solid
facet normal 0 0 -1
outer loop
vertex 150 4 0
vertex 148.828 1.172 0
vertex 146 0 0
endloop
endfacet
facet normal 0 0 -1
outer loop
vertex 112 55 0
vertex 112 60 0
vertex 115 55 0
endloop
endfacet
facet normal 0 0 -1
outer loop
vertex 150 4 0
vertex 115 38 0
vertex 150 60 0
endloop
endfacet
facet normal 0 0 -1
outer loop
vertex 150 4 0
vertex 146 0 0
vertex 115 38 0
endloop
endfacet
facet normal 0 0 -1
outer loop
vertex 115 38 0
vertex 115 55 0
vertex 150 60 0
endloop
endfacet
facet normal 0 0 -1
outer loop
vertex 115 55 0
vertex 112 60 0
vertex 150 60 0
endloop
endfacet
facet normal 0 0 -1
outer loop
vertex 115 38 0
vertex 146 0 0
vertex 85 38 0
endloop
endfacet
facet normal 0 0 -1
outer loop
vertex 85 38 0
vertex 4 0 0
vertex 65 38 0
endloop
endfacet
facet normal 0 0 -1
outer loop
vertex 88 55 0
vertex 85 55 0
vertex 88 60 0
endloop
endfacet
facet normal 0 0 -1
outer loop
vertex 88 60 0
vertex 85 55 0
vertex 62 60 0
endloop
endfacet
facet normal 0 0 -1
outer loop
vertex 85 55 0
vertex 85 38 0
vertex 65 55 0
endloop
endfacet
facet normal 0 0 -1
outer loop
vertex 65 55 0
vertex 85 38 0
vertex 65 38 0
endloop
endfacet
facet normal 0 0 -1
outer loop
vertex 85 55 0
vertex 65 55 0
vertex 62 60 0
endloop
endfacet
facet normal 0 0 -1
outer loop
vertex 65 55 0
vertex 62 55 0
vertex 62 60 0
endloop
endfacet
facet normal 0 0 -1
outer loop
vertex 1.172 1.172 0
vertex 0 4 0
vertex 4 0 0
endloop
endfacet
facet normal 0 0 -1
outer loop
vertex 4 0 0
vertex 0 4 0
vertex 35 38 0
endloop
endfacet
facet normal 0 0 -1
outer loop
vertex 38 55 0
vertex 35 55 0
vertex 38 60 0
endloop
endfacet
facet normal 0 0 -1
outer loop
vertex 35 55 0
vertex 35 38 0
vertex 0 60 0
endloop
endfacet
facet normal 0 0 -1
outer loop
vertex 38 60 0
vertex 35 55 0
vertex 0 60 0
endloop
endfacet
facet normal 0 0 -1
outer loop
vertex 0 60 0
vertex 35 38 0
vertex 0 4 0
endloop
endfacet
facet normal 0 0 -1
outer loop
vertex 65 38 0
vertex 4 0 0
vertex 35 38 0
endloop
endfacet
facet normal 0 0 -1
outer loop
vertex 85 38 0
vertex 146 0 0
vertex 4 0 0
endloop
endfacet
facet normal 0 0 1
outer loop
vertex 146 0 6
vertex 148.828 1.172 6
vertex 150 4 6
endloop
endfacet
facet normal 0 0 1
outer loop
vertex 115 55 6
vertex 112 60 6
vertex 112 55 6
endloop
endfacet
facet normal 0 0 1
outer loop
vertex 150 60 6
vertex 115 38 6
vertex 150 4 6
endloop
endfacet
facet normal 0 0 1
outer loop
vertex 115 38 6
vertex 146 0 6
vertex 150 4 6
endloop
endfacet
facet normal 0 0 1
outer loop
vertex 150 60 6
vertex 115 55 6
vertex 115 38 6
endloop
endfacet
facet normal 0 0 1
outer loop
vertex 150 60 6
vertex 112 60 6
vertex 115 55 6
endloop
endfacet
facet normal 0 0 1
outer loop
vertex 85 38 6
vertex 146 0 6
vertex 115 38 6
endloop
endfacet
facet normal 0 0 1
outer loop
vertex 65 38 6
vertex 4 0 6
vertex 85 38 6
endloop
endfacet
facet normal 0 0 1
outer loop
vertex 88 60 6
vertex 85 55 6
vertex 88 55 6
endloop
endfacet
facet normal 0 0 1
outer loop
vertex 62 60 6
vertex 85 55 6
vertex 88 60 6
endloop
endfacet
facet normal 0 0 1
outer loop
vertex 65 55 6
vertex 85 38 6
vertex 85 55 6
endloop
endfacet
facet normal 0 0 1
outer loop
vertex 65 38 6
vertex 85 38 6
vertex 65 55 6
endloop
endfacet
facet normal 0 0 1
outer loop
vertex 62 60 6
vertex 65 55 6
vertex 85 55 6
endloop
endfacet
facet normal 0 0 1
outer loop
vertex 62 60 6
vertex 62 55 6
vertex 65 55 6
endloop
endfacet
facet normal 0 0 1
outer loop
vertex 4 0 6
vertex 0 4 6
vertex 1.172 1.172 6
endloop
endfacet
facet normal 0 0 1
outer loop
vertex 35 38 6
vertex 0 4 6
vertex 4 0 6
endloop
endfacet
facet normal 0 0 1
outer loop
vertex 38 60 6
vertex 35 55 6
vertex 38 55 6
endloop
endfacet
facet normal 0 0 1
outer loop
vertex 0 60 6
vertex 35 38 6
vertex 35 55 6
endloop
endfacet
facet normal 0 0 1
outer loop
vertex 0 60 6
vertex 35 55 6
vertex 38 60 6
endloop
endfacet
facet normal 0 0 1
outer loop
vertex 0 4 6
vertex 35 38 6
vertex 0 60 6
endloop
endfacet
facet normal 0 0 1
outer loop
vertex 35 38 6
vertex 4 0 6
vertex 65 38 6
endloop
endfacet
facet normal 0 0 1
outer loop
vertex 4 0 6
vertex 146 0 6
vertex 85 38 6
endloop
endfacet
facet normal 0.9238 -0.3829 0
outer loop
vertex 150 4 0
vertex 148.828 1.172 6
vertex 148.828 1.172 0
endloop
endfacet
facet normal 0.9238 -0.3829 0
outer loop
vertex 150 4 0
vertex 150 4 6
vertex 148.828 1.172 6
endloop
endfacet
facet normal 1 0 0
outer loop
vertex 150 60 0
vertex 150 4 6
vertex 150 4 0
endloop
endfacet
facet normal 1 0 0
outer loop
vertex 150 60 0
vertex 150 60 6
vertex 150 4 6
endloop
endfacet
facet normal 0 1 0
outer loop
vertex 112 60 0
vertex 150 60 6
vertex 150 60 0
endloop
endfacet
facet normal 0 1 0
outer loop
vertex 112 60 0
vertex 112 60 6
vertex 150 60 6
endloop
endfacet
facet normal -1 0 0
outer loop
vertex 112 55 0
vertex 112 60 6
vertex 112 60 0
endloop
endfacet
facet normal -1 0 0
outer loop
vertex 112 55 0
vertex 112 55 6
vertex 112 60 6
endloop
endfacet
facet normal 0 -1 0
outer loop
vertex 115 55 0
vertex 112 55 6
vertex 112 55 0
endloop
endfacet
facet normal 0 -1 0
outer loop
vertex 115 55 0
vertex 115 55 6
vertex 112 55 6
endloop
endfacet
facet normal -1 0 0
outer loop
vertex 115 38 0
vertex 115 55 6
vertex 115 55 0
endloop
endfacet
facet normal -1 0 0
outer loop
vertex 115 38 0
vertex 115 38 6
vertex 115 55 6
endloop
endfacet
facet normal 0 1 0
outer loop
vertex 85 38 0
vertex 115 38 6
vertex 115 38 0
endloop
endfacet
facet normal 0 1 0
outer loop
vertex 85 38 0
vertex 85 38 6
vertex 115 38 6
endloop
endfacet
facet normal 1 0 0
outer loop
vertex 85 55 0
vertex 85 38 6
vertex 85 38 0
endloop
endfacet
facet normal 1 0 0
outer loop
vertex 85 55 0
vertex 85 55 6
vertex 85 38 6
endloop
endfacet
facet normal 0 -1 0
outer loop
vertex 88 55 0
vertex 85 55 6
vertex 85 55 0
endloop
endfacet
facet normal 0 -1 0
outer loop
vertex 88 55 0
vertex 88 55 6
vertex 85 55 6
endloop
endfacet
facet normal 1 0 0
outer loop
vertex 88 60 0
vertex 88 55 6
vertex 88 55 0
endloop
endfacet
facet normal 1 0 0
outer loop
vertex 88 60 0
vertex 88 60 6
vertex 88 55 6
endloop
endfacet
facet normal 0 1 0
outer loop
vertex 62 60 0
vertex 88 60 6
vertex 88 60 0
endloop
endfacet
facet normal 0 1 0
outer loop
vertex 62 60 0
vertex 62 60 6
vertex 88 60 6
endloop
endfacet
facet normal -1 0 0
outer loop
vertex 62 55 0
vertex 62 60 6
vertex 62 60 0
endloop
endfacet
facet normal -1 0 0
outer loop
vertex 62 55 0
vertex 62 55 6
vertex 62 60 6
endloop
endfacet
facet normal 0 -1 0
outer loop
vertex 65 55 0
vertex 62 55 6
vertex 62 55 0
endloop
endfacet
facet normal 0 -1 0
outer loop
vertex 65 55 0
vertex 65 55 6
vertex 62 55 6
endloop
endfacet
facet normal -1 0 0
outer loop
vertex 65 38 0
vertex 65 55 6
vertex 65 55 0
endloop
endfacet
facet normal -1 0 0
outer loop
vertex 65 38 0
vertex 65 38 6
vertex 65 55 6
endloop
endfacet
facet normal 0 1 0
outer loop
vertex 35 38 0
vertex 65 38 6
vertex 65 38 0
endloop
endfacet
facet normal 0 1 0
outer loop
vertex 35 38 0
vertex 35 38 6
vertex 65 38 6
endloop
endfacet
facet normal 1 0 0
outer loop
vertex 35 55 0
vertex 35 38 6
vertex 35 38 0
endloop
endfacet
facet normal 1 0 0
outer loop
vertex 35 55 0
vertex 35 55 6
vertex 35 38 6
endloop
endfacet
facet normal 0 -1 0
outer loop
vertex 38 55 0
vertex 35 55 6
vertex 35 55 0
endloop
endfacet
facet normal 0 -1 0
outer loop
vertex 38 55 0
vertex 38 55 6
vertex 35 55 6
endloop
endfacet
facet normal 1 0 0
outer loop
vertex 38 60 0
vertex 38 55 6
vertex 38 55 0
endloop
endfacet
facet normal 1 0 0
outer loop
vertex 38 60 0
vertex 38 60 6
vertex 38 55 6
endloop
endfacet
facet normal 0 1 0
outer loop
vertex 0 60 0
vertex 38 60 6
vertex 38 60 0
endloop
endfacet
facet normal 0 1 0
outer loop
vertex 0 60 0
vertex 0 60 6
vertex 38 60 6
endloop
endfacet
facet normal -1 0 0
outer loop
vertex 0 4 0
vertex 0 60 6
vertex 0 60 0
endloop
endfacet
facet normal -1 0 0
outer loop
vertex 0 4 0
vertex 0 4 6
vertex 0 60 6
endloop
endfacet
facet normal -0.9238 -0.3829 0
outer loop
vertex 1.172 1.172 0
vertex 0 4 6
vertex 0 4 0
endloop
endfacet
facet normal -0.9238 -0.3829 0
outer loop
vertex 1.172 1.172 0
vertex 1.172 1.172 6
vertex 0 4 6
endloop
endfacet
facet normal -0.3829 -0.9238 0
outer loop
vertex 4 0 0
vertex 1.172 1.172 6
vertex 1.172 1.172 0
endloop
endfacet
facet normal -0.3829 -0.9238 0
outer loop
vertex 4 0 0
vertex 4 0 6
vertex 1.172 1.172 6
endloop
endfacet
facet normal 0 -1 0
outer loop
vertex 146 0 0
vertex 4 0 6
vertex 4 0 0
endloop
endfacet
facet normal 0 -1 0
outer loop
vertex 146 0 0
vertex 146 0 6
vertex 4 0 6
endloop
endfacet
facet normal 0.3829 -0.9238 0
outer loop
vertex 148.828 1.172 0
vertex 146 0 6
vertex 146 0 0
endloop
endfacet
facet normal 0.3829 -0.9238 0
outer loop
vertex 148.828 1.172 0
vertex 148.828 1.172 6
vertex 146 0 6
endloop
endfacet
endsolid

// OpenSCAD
$fn = 32;

// ----------------------------------------------------------------------
// Oversize slot bar: 150 mm bar with 2 oversize windows
// ----------------------------------------------------------------------

// --- parameters (mm) ---
profile_height = 6;       // extrusion height
profile_points = 24;      // points of the closed outline

profile = [[0, 4], [1.172, 1.172], [4, 0], [146, 0], [148.828, 1.172], [150, 4], [150, 60], [112, 60], [112, 55], [115, 55], [115, 38], [85, 38], [85, 55], [88, 55], [88, 60], [62, 60], [62, 55], [65, 55], [65, 38], [35, 38], [35, 55], [38, 55], [38, 60], [0, 60]];  // single closed polygon, 24 points, counter clockwise

// --- the one profile operation ---
linear_extrude(height = profile_height) polygon(points = profile);
